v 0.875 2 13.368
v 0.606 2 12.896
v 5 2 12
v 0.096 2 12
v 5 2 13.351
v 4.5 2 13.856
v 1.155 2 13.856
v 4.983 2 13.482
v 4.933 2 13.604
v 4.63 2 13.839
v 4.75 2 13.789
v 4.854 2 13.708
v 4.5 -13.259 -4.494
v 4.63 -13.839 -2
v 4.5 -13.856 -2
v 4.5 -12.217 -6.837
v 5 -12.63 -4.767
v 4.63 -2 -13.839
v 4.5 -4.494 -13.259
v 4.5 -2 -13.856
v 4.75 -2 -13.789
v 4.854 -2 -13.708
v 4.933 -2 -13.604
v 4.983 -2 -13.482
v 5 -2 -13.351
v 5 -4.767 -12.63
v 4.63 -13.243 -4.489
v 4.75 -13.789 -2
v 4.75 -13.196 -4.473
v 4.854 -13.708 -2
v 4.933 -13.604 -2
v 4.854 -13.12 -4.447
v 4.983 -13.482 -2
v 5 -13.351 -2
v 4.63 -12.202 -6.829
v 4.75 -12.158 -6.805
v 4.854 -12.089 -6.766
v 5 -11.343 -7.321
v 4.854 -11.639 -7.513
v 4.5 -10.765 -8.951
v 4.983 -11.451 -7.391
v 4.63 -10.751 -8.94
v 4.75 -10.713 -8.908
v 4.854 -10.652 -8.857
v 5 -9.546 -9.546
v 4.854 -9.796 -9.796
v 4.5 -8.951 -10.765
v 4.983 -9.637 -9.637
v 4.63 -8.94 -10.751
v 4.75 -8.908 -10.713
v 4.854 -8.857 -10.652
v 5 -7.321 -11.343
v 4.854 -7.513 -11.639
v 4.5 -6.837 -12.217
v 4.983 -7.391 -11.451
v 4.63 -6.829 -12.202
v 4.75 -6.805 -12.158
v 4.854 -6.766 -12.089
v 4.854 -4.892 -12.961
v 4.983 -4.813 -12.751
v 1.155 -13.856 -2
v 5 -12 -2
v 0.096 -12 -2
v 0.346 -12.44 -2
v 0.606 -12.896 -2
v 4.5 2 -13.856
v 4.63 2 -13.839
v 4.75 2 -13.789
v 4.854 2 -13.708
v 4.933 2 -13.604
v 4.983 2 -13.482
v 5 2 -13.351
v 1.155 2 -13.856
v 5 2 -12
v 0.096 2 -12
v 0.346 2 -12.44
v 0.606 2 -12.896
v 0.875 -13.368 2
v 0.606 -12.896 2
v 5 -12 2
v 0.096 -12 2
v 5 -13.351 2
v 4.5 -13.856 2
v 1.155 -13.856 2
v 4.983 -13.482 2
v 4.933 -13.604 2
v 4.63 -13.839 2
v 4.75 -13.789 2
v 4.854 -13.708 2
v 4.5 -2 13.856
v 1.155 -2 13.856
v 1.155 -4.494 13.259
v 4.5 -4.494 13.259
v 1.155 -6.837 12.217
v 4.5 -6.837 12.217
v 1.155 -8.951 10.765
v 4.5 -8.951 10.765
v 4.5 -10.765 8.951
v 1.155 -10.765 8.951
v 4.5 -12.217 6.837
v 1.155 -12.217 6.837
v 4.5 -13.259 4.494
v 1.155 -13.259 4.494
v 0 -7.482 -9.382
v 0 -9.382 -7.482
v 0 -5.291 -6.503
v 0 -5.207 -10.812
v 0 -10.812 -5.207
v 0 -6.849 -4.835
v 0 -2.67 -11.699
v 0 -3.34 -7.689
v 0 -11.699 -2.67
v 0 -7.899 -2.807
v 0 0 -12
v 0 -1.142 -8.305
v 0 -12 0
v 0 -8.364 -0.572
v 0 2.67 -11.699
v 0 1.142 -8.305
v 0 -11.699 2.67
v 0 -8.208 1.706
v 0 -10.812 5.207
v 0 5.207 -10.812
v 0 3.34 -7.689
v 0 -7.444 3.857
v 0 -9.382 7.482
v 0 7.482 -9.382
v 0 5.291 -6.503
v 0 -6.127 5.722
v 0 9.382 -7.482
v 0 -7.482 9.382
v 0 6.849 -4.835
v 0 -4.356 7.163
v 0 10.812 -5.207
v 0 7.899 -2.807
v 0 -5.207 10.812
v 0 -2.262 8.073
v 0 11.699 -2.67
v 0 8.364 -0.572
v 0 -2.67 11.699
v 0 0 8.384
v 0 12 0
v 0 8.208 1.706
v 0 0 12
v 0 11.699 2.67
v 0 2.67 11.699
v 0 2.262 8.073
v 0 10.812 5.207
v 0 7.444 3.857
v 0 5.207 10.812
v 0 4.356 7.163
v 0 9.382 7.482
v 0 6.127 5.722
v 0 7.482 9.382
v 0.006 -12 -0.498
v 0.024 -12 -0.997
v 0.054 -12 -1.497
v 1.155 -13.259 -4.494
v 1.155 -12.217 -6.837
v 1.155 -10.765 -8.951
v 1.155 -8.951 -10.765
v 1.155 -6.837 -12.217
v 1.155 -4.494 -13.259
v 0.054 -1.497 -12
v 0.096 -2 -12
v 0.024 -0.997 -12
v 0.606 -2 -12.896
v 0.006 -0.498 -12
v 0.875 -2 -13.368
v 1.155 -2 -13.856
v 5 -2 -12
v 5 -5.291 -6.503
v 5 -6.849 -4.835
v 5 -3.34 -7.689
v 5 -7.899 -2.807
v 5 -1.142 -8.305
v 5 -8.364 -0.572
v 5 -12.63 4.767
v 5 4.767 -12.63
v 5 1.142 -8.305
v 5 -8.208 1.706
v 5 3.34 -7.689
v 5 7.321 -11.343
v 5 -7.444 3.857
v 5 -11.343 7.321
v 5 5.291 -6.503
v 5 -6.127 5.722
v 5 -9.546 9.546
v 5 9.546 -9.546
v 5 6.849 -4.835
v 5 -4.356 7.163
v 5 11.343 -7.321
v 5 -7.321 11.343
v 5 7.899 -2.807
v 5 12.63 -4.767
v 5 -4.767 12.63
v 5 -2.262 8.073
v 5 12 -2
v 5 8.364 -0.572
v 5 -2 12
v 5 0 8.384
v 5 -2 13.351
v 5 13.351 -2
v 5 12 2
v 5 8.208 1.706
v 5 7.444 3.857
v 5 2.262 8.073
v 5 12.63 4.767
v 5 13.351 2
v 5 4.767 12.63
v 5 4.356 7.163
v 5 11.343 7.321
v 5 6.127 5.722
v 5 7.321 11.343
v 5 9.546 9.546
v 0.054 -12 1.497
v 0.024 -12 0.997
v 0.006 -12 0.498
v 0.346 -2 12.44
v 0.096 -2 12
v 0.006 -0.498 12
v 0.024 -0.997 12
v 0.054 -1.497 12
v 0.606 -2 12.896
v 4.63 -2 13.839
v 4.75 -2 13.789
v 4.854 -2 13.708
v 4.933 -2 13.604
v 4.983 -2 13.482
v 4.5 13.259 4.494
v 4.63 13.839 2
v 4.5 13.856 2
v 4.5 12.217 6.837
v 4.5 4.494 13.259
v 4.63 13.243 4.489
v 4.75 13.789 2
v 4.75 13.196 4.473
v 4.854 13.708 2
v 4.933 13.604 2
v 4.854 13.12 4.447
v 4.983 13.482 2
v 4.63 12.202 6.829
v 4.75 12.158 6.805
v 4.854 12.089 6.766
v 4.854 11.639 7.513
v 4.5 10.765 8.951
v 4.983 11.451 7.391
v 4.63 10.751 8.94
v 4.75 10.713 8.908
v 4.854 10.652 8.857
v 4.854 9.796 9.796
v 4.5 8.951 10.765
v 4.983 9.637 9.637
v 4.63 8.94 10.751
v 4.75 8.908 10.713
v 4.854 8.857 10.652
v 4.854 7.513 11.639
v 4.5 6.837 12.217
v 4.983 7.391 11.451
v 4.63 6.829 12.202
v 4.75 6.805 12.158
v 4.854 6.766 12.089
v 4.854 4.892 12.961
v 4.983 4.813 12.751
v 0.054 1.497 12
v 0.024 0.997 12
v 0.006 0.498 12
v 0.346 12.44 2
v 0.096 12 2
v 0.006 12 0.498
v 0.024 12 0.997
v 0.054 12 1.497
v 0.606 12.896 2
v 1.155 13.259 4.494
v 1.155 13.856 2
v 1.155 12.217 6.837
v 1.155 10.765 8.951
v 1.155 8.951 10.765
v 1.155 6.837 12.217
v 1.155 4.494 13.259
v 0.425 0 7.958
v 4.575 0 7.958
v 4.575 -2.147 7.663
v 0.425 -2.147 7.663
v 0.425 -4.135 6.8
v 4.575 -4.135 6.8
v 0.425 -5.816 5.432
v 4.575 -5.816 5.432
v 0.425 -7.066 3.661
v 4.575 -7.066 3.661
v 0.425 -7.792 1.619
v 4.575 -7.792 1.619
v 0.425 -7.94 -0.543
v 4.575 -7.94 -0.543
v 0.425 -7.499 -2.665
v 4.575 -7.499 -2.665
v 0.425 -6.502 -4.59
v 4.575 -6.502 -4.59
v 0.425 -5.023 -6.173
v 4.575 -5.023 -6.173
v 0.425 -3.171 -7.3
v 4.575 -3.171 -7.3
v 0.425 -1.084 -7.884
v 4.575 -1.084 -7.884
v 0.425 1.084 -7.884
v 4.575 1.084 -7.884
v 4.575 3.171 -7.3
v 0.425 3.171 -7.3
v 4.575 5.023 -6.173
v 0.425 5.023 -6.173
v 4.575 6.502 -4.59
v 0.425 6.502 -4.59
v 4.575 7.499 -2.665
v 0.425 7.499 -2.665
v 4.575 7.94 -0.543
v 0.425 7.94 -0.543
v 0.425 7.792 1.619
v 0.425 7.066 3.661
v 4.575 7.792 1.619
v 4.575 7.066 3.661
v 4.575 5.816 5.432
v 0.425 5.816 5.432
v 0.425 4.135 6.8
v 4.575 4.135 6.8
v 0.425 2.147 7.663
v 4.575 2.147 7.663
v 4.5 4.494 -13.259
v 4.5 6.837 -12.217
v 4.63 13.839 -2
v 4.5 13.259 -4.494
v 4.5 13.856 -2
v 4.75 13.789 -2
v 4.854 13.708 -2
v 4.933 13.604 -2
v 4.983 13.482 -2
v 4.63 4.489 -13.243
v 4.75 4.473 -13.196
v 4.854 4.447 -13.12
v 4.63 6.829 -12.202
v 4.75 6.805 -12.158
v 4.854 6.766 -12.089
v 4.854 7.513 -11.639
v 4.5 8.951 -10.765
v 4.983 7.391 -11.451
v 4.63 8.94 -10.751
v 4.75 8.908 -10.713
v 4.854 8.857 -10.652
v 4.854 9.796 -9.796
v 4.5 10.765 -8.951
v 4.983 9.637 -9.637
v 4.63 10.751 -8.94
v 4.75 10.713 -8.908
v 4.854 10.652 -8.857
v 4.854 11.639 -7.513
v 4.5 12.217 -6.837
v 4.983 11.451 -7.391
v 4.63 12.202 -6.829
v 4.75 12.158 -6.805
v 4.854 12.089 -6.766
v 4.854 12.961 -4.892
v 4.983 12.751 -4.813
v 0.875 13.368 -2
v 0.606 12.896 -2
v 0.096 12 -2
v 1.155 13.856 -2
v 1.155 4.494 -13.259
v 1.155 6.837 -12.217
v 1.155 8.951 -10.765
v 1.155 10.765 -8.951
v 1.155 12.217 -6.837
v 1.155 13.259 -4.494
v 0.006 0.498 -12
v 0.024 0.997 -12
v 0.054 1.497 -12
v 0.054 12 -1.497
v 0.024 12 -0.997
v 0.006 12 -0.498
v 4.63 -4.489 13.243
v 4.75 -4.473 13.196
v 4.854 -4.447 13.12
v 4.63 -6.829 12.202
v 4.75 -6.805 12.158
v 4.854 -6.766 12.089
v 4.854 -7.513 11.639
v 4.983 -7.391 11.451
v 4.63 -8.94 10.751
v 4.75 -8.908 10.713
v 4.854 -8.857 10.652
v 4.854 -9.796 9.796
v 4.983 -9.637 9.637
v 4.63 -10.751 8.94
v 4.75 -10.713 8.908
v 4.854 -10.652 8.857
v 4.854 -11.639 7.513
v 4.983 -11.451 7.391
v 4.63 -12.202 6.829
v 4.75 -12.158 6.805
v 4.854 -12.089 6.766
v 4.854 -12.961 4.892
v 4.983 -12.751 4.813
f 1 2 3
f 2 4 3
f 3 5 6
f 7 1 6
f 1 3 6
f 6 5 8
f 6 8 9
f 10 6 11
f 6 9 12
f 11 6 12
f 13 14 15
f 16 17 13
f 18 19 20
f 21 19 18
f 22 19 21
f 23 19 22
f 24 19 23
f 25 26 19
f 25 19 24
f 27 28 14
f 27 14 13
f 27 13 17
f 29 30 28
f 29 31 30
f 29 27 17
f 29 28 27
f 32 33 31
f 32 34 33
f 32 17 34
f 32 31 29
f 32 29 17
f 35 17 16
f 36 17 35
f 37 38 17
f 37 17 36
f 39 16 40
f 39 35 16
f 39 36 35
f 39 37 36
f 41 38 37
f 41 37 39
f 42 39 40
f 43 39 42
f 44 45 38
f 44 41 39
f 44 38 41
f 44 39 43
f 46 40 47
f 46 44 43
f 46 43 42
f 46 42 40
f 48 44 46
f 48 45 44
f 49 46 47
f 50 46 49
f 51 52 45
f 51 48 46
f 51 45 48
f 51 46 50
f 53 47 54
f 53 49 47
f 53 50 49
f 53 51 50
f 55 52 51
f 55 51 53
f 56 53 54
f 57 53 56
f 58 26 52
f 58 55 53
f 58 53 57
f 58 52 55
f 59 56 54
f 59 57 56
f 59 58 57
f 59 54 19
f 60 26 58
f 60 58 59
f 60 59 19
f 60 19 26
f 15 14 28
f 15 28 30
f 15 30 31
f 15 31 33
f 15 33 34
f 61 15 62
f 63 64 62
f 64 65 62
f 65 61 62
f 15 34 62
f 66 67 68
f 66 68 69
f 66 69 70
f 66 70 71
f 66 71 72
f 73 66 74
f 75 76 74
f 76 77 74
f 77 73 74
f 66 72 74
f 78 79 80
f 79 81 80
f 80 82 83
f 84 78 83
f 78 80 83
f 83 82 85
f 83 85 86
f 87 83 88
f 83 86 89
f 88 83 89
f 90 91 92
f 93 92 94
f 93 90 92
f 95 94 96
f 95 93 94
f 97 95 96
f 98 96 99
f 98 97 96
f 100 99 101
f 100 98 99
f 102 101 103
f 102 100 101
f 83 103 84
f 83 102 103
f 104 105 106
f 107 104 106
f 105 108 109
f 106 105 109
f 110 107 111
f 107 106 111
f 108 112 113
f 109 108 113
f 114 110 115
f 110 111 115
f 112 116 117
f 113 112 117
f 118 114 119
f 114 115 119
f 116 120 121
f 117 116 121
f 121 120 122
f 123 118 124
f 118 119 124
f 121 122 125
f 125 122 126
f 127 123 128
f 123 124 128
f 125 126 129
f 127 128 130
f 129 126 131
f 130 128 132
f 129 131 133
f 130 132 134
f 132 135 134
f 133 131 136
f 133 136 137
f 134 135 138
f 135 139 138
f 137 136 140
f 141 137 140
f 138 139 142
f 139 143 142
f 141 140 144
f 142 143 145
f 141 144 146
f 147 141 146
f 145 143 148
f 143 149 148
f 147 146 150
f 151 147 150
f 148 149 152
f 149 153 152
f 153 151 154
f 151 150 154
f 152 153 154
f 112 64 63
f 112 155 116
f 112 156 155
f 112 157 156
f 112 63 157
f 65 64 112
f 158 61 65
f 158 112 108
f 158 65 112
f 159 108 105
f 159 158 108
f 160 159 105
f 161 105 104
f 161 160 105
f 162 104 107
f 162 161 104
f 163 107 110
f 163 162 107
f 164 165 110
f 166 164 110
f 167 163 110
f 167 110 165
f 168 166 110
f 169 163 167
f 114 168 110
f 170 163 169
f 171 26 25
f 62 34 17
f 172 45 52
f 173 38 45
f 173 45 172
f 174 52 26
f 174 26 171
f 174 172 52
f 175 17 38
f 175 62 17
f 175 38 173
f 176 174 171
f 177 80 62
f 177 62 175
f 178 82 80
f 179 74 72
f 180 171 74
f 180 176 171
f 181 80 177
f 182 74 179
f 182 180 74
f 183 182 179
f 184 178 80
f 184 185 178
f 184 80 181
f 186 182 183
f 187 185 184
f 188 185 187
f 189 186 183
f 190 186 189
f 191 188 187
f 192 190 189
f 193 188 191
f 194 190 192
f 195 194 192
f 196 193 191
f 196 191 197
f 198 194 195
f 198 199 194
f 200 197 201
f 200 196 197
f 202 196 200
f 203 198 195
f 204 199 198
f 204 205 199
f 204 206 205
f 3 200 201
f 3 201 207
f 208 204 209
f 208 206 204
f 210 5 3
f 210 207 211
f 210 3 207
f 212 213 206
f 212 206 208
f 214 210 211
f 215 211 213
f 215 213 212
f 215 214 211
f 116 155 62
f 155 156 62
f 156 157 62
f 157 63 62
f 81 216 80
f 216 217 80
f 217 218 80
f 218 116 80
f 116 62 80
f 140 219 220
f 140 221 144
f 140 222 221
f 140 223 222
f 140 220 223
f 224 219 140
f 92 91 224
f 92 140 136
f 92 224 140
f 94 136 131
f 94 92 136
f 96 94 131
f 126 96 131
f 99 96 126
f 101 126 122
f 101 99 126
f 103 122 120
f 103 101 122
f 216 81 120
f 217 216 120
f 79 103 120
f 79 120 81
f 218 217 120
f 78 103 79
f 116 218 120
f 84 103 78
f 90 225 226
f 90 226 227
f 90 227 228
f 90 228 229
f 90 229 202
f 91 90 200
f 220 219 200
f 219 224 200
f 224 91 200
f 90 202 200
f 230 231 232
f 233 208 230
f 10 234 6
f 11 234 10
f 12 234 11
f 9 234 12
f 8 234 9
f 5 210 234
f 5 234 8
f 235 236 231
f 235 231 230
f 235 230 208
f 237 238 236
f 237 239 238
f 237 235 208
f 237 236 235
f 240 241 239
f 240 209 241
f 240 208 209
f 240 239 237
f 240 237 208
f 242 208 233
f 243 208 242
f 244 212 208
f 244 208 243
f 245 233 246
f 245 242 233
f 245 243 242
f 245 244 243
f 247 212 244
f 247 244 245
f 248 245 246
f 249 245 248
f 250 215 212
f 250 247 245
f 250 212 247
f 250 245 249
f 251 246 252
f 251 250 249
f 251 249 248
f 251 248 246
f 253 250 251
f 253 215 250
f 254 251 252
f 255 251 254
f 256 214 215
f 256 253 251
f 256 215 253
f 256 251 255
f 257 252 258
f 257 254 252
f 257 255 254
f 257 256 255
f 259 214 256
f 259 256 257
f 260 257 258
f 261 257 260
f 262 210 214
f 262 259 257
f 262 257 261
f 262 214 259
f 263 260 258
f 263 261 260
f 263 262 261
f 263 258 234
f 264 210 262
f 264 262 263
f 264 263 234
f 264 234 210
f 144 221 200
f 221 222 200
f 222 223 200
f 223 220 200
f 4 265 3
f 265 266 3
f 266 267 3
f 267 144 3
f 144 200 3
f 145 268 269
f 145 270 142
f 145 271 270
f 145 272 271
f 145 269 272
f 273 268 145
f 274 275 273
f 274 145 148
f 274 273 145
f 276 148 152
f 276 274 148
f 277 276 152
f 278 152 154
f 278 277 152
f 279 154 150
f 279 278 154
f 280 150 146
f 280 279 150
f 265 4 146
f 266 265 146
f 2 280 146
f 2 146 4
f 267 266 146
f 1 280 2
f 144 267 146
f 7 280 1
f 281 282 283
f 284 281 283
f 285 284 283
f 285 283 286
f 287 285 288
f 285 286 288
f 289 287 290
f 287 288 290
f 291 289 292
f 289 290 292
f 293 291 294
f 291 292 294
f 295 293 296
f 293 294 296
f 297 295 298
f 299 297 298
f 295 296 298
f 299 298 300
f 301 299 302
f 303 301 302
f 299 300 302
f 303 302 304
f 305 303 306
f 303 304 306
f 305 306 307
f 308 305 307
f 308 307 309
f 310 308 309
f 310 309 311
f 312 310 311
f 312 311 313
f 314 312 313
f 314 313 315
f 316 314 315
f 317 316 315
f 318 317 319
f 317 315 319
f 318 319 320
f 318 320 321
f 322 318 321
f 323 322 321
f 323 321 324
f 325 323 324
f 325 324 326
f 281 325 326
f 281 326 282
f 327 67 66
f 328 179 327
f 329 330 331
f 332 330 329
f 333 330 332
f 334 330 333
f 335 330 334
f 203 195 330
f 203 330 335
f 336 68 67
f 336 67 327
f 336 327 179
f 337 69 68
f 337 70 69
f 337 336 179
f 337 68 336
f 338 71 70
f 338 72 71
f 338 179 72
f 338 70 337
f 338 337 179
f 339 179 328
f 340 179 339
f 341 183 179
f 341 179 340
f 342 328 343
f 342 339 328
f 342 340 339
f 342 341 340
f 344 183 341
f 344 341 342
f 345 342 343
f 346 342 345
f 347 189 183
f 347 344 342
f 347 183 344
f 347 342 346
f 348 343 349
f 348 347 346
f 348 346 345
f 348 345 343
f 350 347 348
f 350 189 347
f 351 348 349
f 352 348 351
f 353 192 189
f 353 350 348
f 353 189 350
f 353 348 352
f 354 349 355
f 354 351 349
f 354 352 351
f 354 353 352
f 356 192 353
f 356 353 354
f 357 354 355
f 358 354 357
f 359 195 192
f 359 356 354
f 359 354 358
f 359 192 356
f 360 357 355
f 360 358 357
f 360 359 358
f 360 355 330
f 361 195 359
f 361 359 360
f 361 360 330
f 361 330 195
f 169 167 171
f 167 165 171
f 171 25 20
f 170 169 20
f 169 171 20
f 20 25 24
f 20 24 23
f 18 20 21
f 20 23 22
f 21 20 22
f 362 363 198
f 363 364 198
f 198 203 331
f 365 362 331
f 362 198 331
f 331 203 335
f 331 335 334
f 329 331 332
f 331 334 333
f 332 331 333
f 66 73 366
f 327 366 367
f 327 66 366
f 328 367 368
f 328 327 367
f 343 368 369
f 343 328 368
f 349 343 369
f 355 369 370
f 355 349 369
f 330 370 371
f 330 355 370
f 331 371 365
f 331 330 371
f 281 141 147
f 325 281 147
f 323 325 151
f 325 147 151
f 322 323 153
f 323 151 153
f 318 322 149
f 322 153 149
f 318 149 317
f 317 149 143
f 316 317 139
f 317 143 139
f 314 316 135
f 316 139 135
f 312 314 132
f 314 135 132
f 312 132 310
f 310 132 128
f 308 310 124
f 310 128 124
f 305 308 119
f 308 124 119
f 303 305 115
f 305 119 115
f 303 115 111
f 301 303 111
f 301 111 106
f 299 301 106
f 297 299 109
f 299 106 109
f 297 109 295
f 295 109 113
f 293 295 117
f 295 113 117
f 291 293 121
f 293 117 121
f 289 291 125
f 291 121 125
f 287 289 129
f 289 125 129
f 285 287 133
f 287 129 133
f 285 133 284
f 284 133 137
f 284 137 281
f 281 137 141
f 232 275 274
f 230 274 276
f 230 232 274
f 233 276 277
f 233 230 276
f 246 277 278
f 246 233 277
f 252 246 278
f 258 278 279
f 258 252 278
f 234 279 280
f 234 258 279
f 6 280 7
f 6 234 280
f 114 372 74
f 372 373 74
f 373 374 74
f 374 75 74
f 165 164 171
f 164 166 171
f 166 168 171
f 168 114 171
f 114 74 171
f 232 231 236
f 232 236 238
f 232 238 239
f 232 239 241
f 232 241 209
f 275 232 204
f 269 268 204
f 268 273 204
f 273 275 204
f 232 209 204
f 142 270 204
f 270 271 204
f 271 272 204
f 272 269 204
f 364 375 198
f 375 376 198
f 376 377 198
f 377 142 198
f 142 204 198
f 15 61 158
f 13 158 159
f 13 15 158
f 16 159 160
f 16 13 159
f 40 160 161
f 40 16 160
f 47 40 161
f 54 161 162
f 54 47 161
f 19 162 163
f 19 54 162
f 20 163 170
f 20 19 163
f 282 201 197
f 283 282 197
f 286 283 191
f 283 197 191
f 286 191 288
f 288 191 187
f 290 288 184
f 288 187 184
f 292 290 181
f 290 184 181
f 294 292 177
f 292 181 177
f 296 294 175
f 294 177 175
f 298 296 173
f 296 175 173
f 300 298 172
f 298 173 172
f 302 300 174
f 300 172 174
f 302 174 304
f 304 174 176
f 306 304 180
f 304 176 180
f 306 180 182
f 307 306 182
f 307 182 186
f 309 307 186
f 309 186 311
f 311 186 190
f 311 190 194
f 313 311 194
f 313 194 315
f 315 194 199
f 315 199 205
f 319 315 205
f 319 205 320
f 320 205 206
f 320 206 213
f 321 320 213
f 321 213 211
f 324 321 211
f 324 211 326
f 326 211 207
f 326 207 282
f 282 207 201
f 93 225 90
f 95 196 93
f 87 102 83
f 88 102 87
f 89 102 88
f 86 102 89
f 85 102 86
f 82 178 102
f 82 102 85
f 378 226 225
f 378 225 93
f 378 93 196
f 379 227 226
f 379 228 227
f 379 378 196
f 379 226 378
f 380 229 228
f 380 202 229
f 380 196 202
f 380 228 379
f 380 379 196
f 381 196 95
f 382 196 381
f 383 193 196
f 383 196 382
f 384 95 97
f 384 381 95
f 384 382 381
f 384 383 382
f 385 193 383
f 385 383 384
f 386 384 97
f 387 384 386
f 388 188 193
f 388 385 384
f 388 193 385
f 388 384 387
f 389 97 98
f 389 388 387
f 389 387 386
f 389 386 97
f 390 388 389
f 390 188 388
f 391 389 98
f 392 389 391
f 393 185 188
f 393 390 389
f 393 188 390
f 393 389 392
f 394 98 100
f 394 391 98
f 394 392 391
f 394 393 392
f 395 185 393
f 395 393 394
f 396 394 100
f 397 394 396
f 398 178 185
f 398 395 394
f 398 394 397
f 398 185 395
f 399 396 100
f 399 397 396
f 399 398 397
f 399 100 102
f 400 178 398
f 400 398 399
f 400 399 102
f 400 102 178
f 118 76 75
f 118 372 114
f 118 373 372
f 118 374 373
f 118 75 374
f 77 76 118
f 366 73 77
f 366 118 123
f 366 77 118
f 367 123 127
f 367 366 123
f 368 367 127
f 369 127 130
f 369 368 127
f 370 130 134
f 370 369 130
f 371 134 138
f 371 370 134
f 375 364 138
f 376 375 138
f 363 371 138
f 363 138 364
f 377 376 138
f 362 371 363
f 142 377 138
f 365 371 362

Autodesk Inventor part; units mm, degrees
ref_plane "YZ Plane" through (0, 0, 0) normal (1, 0, 0) x (0, 1, 0)
ref_plane "XZ Plane" through (0, 0, 0) normal (0, 1, 0) x (-1, 0, 0)
sketch "Skizze1" plane through (0, 0, 0) normal (0, 0, 1) x (1, 0, 0)
  line L0 (0, 0) -> (5, 0)
  line L1 (0, 0) -> (0, 14)
  line L2 (0, 14) -> (5, 14)
  line L3 (5, 14) -> (5, 0)
  line L4 (0, 16.8) -> (0, -2.8) projected
  line L5 (-1, 0) -> (6, 0) projected
  dimension "d1" = 28
  dimension "d2" = 5
revolve "Körper" add sketch "Skizze1" angle 360 about axis through (0, 0, 0) along (1, 0, 0)
sketch "Skizze2" plane through (0, 0, 0) normal (-1, 0, 0) x (0, 0, 1)
  circle A0 centre (0, 0) radius 14 projected
  point P0 (0, 0)
hole "Gewinde" at (0, 0, 0) direction (1, 0, 0) diameter 15.917 end through all thread size "M17x1" class "6H" standard "ISO Metric profile"
chamfer "Fase1" distance 2 angle 30 1 edges at (0, -14, 0) measured on face at (0, 11.8312, -1.4366)
sketch "Skizze3" plane through (5, 0, 0) normal (1, 0, 0) x (0, 0, -1)
  circle A0 centre (0, 0) radius 14 projected
  line L0 (-2, 13.8564) -> (-2, 12)
  line L1 (-2, 12) -> (2, 12)
  line L2 (2, 12) -> (2, 13.8564)
  line L3 (0, -19.6) -> (0, 19.6) projected
  line L4 (-19.6, 0) -> (19.6, 0) projected
  dimension "d12" = 2
  dimension "d13" = 2
  dimension "d14" = 12
extrude "Nut1" cut sketch "Skizze3" against normal through all contours L2 L1 L3 A0 | L3 L1 L0 A0
pattern_circular "Nuten1" count 4 over 360 about axis through (-10, 0, 0) along (1, 0, 0) of "Nut1"
fillet "Rundung1" radius 0.5 4 edges at (5, 9.8995, 9.8995) (5, 9.8995, -9.8995) (5, -9.8995, -9.8995) (5, -9.8995, 9.8995)
chamfer "Fase2" distance 0.425 angle 45 1 edges at (5, 0, -7.9585) measured on face at (5, -10.6335, 0.3198)
chamfer "Fase3" distance 0.425 angle 45 1 edges at (0, 0, -7.9585) measured on face at (0, 0.8901, -10.5525)
ref_plane "Work Plane1" through (39.9124, 0, 0) normal (0, 1, 0) x (-1, 0, 0)
equation "\"d1\" = SD2"
equation "\"d2\" = KOH"
equation "\"d12\" = 0.5 * SNB"
equation "\"d13\" = 0.5 * SNB"
equation "\"d14\" = 0.5 * SD2 - SNT"
equation "\"d10\" = -0.5 * LADI + 0.5 * SD2"
equation "\"d11\" = FAWI2"
equation "\"d40\" = -0.5 * LADI + 0.5 * SD2"
equation "\"d18\" = RR"
equation "\"d19\" = 0.025 * NND"
equation "\"d41\" = 0.025 * NND"
equation "\"d21\" = 0.025 * NND"
equation "\"d42\" = 0.025 * NND"
equation "\"NND\" = 17"
equation "\"KOH\" = 5"
equation "\"SD2\" = 28"
equation "\"SNB\" = 4"
equation "\"SNT\" = 2"
equation "\"LADI\" = 24"
equation "\"RR\" = 0.5"
equation "\"FAWI2\" = 30deg"
equation "\"GUL\" = 0.61345 * PTC"
equation "\"THREADDIA\" = 17"
equation "\"TOA\" = 30deg"
equation "\"PTC\" = 1"
equation "\"GAL\" = 0.61345 * PTC"
equation "\"GD1\" = THREADDIA - 1.2269 * PTC"
properties part number "DIN 981 - KM 3" material "Stahl, weich"
